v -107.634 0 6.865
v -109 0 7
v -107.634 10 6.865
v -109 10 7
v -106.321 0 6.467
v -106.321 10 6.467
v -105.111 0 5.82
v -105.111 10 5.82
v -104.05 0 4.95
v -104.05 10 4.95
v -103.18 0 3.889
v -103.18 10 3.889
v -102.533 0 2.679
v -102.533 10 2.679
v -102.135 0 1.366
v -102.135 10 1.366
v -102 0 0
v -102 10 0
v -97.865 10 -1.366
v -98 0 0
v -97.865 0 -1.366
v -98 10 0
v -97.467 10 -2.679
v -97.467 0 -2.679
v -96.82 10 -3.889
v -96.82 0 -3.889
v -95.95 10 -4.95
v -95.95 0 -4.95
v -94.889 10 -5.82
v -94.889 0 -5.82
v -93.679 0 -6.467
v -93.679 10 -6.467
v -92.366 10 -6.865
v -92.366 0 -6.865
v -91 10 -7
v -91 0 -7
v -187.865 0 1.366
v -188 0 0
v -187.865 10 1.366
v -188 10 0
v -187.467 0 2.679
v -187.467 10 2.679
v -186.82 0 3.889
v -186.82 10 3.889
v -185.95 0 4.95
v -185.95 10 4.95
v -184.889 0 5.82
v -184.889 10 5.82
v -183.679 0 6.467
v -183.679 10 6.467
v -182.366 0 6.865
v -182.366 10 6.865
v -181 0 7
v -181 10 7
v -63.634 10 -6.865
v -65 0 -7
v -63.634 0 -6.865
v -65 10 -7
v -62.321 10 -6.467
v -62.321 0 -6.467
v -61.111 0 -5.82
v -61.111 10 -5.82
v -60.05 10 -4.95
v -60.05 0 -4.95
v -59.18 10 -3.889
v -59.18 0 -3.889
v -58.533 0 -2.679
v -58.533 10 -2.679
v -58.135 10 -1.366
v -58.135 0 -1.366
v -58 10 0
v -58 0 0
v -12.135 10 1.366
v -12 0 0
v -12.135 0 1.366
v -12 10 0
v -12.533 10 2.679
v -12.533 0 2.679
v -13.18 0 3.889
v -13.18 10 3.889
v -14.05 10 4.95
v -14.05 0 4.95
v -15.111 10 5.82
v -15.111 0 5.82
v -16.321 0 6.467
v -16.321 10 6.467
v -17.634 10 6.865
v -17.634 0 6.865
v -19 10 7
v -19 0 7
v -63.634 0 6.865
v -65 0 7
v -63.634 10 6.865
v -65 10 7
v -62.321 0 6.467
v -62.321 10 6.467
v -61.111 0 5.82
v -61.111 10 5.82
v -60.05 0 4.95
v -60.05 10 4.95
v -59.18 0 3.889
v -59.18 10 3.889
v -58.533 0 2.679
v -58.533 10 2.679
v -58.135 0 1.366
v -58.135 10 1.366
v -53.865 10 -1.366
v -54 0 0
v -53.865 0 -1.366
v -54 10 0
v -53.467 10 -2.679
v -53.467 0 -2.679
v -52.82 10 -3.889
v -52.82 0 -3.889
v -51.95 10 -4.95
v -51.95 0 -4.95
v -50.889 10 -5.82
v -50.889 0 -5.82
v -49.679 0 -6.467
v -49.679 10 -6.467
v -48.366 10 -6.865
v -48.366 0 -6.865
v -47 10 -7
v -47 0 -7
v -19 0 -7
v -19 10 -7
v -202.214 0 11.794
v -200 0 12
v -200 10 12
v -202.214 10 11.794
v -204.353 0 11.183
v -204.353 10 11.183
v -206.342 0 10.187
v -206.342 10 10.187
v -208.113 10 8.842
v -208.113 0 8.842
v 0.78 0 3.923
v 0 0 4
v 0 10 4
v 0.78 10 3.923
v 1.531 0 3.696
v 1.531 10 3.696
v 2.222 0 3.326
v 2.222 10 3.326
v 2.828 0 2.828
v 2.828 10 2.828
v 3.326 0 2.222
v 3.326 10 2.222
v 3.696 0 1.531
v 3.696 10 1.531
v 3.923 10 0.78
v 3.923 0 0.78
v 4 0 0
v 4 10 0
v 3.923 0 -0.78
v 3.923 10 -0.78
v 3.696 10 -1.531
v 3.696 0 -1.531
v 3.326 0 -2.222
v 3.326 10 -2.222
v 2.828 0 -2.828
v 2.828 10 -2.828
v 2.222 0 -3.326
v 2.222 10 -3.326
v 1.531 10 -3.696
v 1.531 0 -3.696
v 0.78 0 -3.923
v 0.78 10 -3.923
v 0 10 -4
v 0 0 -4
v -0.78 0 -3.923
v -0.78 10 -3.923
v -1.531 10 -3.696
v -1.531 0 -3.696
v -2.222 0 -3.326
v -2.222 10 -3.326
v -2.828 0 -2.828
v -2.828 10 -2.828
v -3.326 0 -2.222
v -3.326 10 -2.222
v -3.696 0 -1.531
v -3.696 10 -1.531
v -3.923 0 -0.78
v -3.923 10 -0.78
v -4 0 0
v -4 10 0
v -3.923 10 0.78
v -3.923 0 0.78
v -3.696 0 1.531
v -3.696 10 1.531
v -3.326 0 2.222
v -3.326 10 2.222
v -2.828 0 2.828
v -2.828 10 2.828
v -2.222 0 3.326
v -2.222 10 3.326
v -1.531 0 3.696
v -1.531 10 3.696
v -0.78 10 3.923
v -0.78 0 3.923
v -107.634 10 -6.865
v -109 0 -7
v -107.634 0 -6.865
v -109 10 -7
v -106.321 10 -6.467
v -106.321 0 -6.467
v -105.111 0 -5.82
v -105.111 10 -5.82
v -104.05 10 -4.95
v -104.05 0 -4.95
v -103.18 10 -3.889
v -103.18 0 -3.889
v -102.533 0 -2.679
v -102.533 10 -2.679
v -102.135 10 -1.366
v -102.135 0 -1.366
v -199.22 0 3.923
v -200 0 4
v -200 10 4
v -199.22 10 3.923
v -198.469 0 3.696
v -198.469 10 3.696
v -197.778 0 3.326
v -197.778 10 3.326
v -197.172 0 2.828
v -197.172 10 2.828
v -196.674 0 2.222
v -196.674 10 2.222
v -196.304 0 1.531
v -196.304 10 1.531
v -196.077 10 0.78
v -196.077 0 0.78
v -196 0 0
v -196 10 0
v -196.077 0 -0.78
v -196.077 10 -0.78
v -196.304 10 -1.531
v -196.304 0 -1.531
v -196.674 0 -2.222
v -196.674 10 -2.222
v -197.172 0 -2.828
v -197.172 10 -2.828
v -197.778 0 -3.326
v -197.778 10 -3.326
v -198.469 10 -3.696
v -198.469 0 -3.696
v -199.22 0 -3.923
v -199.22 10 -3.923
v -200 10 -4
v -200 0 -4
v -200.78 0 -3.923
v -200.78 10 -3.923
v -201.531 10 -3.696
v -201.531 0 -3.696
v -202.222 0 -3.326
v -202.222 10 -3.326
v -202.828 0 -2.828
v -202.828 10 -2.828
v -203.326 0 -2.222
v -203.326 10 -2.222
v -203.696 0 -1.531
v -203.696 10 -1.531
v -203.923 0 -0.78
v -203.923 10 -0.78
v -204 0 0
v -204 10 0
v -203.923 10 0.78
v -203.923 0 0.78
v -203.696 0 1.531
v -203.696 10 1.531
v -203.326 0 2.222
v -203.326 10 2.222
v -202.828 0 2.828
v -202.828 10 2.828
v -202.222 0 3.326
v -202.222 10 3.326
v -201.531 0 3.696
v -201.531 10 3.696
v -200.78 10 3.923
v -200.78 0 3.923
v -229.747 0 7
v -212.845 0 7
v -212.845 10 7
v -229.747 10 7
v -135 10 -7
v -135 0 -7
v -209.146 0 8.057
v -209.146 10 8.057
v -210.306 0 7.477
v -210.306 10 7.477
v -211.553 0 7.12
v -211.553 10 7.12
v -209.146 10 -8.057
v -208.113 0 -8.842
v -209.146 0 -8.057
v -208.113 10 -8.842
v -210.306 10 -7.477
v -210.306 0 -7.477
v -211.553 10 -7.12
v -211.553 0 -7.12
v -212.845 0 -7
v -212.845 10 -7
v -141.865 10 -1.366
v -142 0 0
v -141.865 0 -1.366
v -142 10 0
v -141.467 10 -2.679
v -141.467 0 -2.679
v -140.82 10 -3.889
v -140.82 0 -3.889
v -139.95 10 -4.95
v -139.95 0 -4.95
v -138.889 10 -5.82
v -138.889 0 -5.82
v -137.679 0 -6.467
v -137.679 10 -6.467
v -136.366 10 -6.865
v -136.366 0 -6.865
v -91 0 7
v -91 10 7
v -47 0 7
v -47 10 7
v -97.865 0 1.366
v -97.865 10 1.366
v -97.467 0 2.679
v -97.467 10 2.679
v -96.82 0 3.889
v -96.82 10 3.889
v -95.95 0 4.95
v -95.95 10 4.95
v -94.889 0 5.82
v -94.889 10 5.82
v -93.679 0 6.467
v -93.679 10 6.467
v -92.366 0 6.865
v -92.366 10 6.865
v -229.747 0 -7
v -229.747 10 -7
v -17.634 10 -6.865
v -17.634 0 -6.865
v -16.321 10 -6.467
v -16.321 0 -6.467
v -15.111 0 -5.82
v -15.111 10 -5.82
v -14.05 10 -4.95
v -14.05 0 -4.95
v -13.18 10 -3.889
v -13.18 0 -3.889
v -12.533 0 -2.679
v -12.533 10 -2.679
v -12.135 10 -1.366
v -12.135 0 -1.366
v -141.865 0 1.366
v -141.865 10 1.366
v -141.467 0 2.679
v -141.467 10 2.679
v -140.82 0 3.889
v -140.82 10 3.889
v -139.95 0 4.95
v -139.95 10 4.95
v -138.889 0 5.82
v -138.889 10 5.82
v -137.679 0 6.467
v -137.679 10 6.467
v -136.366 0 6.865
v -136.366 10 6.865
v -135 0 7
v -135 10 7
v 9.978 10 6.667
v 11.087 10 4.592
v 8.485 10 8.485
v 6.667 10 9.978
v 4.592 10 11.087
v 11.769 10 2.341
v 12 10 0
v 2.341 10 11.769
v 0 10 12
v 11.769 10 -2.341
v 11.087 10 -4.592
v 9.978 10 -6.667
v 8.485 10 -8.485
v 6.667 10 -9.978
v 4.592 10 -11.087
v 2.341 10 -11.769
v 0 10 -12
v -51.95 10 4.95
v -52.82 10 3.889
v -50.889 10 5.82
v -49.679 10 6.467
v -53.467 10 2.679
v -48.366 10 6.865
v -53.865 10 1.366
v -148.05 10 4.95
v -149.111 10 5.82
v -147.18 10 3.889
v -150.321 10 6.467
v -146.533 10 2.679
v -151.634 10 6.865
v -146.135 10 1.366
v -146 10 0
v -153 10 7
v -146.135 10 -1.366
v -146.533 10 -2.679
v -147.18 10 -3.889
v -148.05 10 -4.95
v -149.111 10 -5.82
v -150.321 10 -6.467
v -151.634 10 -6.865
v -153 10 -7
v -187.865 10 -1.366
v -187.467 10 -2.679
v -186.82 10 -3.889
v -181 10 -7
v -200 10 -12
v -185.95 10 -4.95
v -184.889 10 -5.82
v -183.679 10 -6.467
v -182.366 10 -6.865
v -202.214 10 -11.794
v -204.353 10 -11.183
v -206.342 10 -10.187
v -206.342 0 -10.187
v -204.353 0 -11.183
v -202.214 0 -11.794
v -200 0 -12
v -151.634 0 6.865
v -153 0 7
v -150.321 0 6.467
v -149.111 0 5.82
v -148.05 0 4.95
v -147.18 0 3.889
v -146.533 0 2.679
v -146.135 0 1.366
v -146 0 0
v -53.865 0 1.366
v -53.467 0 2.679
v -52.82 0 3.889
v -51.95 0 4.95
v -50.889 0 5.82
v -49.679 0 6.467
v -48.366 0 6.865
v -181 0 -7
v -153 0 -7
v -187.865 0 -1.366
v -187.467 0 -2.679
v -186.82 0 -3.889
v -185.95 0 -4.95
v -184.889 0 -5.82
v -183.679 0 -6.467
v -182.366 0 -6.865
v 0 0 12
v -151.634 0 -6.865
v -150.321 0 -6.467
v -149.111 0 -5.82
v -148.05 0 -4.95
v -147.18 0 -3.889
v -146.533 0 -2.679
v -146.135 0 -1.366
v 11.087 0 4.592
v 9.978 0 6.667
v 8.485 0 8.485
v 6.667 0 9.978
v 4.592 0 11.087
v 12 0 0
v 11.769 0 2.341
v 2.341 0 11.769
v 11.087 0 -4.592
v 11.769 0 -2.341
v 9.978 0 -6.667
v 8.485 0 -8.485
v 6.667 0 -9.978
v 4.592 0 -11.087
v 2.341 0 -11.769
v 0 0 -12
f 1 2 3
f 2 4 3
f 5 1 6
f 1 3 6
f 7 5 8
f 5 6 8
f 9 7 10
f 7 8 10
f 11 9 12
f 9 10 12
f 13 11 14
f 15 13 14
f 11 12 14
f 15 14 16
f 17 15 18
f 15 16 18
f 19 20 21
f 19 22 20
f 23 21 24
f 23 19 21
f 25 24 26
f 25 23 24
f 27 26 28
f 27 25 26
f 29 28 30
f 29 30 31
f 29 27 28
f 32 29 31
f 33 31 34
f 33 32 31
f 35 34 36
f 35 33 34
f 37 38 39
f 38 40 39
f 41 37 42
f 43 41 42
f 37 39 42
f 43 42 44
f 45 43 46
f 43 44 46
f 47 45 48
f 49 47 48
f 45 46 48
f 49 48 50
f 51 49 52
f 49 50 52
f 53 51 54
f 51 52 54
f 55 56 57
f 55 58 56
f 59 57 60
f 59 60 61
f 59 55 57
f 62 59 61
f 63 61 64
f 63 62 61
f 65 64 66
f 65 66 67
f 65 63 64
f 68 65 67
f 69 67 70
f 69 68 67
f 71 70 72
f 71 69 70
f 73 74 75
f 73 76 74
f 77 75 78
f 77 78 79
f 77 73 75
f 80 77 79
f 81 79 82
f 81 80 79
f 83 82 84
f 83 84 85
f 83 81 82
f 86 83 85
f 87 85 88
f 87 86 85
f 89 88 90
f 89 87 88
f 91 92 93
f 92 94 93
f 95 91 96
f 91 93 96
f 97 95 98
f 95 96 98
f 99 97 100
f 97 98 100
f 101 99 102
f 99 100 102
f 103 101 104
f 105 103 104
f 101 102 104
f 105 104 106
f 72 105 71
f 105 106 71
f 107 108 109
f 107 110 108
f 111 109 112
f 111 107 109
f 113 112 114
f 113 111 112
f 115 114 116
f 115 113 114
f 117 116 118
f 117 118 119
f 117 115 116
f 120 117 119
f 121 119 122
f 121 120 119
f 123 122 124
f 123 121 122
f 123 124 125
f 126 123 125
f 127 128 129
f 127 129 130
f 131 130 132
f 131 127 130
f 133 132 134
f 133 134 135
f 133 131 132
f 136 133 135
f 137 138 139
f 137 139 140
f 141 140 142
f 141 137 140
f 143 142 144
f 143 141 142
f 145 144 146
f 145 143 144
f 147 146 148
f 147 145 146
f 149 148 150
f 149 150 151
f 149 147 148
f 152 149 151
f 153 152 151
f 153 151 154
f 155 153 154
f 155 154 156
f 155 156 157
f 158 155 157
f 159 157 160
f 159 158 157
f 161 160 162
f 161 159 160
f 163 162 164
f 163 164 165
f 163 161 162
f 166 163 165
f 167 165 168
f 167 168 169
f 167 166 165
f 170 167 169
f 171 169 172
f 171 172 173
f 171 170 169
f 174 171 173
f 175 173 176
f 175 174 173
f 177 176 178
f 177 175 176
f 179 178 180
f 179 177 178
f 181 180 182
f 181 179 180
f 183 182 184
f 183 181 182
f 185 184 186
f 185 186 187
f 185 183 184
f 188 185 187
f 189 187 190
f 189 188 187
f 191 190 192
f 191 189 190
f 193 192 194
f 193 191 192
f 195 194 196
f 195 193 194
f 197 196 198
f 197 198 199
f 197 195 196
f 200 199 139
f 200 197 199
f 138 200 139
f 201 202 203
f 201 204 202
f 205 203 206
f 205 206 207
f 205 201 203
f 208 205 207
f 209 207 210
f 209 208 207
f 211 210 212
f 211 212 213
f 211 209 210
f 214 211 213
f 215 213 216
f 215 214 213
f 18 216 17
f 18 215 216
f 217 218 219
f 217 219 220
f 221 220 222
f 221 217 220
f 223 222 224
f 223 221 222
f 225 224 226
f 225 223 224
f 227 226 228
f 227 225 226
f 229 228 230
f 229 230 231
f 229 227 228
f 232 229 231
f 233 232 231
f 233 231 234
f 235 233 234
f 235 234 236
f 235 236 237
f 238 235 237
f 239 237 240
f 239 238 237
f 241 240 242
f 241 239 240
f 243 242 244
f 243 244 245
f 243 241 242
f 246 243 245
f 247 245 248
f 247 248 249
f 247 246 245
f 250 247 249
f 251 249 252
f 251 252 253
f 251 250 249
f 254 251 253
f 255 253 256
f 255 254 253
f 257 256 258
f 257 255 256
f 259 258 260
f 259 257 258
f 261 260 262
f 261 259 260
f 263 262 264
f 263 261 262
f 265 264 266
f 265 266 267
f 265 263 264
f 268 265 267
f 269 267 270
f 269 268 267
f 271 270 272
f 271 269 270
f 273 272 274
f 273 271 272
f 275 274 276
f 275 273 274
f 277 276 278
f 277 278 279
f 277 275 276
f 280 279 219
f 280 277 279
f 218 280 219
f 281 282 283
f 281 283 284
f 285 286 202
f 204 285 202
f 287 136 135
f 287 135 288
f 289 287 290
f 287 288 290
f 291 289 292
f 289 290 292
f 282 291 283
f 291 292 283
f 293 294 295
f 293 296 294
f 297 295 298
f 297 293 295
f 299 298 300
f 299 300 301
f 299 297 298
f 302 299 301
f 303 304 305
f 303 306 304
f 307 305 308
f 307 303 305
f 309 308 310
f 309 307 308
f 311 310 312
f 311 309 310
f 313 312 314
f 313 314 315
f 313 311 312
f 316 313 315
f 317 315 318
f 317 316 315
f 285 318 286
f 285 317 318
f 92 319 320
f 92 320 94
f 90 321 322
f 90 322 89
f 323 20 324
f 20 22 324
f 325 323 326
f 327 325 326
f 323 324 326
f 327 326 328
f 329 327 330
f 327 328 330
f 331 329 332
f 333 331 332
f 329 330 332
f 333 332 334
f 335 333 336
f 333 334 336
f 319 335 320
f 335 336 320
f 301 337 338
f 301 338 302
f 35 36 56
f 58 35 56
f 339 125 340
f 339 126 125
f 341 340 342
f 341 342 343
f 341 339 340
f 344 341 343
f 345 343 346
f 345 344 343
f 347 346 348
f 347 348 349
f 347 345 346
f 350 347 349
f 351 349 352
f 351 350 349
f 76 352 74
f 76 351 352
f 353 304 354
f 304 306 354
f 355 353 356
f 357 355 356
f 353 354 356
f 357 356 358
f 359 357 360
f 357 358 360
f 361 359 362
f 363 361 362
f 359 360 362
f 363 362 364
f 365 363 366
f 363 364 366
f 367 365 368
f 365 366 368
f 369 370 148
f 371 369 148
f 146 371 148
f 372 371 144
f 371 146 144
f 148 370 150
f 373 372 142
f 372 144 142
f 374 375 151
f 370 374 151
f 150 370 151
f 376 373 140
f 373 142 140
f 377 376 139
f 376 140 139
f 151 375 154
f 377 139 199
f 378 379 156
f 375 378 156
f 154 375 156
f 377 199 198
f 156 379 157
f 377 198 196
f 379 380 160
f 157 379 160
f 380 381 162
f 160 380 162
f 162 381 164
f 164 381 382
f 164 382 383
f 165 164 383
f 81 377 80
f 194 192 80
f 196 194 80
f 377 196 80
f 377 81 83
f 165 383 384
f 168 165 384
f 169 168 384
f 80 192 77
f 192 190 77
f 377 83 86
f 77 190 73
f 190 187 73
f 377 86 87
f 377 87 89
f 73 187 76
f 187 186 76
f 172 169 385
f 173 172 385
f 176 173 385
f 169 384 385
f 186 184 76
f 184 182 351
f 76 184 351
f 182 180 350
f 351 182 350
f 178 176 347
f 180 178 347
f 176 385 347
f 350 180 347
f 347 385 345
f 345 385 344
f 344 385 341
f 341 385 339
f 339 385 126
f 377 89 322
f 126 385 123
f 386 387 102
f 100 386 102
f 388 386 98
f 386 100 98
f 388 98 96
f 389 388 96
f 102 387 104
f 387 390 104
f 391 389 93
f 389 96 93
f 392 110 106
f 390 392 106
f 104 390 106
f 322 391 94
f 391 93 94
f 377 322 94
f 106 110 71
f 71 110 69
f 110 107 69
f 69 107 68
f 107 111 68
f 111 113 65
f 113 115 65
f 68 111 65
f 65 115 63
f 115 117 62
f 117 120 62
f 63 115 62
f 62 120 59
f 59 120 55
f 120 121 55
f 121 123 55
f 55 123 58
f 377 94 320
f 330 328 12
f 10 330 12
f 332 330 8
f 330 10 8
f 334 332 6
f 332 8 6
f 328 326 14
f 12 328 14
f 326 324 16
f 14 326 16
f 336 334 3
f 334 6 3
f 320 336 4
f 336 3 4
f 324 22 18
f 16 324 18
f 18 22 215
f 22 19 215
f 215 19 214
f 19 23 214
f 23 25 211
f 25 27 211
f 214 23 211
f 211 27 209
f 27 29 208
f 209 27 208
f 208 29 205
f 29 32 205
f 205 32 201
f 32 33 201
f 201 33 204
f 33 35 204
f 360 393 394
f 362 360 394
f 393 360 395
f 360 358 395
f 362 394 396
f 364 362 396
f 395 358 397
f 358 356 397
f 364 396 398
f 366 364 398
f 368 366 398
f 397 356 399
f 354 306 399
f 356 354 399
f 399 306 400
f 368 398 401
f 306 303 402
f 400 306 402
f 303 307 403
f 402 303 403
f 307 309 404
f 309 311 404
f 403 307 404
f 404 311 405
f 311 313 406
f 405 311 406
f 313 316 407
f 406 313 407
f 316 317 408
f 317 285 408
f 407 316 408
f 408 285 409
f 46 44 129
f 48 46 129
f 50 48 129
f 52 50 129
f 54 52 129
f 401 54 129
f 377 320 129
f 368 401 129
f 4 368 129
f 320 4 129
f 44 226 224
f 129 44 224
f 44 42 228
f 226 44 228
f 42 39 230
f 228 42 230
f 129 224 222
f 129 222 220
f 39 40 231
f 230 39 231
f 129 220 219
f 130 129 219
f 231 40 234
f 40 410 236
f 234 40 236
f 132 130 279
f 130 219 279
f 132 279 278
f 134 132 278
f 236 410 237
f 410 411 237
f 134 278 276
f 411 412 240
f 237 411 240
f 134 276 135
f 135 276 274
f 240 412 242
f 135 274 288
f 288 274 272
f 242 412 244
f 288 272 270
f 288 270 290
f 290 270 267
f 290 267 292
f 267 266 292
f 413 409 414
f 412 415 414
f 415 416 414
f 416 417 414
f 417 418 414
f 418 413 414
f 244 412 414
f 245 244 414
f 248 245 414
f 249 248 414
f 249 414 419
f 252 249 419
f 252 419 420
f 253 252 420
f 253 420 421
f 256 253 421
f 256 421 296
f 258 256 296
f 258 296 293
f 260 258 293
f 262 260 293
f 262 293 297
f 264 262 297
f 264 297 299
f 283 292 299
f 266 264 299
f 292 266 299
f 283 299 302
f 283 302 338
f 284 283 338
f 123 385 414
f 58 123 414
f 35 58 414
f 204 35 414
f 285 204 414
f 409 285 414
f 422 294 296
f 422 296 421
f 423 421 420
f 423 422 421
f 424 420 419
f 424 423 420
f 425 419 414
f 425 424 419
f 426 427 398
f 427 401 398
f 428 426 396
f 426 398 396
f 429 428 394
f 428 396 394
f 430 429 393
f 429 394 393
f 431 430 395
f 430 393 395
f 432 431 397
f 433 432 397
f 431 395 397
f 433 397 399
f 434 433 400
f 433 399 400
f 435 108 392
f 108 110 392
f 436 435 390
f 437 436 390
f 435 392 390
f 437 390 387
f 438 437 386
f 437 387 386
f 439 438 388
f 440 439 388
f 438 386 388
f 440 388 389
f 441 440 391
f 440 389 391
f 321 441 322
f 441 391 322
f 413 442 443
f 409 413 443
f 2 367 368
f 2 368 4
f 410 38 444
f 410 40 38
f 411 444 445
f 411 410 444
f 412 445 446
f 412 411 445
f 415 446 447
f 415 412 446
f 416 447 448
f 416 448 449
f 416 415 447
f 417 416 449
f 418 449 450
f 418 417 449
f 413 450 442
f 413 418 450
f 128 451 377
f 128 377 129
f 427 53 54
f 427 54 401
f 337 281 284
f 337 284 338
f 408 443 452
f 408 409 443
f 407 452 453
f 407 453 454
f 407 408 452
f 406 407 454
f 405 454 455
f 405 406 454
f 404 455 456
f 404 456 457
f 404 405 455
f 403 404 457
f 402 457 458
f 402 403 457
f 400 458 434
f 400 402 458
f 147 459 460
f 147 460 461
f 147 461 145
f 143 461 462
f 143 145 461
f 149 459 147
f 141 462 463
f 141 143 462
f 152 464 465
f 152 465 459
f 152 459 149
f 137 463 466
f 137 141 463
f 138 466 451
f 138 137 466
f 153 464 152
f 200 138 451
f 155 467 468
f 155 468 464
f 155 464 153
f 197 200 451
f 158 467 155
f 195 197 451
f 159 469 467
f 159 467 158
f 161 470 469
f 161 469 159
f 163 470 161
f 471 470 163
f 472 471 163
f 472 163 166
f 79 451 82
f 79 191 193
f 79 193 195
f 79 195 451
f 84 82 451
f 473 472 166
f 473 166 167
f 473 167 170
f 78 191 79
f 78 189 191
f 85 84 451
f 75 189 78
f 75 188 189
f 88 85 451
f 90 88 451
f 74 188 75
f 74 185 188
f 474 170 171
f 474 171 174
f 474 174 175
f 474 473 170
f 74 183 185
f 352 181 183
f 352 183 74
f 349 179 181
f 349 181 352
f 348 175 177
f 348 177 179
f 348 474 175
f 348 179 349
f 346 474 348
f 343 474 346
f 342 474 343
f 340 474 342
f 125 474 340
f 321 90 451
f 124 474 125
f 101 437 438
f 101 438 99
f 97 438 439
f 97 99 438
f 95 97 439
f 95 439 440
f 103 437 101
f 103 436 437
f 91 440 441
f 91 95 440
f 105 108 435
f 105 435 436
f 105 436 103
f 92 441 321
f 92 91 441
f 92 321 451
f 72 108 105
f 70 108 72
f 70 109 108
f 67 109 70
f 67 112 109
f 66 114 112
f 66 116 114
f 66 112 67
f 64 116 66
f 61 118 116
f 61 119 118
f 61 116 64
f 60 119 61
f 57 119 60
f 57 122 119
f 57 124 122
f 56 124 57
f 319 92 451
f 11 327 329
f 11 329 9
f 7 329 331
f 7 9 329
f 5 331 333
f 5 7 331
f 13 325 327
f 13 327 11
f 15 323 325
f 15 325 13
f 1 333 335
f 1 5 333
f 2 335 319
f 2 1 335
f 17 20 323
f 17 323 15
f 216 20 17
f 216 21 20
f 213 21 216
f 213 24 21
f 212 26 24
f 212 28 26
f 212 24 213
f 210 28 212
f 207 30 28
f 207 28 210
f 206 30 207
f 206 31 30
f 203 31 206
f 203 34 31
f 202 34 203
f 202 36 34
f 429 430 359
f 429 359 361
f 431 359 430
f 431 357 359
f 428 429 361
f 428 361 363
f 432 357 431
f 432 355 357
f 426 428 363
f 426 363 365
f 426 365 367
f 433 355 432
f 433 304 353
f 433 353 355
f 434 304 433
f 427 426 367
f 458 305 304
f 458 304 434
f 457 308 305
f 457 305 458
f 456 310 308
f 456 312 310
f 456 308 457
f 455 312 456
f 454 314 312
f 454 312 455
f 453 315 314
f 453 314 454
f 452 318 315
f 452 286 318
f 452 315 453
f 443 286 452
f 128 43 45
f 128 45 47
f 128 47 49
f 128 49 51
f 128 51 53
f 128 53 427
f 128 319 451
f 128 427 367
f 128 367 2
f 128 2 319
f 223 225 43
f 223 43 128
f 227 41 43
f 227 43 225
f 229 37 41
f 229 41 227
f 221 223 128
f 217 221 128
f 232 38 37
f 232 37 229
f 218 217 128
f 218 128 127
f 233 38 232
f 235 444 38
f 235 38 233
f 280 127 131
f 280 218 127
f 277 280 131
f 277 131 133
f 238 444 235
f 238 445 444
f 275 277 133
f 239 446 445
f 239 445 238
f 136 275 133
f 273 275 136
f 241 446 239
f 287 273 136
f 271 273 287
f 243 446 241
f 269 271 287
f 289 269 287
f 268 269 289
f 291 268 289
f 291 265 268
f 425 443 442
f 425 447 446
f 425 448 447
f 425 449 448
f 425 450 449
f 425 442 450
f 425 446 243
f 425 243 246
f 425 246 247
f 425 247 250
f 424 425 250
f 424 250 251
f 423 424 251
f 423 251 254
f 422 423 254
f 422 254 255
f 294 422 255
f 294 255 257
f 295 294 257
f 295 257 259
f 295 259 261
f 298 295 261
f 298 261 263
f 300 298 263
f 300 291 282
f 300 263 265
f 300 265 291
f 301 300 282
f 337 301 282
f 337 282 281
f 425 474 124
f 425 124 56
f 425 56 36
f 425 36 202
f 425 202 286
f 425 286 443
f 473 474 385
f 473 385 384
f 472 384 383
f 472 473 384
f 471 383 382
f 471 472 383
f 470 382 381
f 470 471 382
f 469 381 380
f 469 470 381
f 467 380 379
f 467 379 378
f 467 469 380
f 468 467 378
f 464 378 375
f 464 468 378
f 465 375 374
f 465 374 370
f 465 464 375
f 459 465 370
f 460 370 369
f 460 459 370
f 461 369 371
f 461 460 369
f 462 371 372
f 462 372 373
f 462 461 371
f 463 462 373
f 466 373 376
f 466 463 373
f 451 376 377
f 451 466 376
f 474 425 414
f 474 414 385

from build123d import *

# Parameters (mm, degrees)
SKETCH1_R           = 4
SKETCH1_W           = 42
SKETCH1_H           = 14
SKETCH1_W_2         = 40
BOSS_EXTRUDE1_DEPTH = 10
FILLET1_R           = 7


with BuildPart() as part:
    # Sketch1 → Boss-Extrude1 (new body)
    with BuildSketch(Plane(origin=(0, 0, 0), x_dir=(1, 0, 0), z_dir=(0, 1, 0))):
        with BuildLine():
            Line((-200, 12), (0, 12))
            ThreePointArc((0, 12), (12, 0), (0, -12))
            Line((0, -12), (-200, -12))
            ThreePointArc((-200, -12), (-205.477225575, -10.677078252), (-209.746794345, -7))
            Line((-209.746794345, -7), (-229.746794345, -7))
            Line((-229.746794345, -7), (-229.746794345, 7))
            Line((-229.746794345, 7), (-209.746794345, 7))
            ThreePointArc((-209.746794345, 7), (-205.477225575, 10.677078252), (-200, 12))
        make_face()
        with Locations(Location((-200, 0, 0), (0, 0, 270))):
            Circle(SKETCH1_R, mode=Mode.SUBTRACT)
        with Locations(Location((0, 0, 0), (0, 0, 270))):
            Circle(SKETCH1_R, mode=Mode.SUBTRACT)
        with Locations((-167, 0)):
            Rectangle(SKETCH1_W, SKETCH1_H, mode=Mode.SUBTRACT)
        with Locations((-122, 0)):
            Rectangle(SKETCH1_W_2, SKETCH1_H, mode=Mode.SUBTRACT)
        with Locations((-78, 0)):
            Rectangle(SKETCH1_W_2, SKETCH1_H, mode=Mode.SUBTRACT)
        with Locations((-33, 0)):
            Rectangle(SKETCH1_W, SKETCH1_H, mode=Mode.SUBTRACT)
    extrude(amount=BOSS_EXTRUDE1_DEPTH)

    # Fillet1
    fillet1_edges = [part.edges().sort_by_distance(p)[0] for p in [
        (-142, 5, -7),
        (-98, 5, -7),
        (-54, 5, -7),
        (-58, 5, -7),
        (-12, 5, -7),
        (-102, 5, -7),
        (-146, 5, -7),
        (-146, 5, 7),
        (-102, 5, 7),
        (-58, 5, 7),
        (-12, 5, 7),
        (-54, 5, 7),
        (-98, 5, 7),
        (-142, 5, 7),
        (-188, 5, 7),
        (-188, 5, -7),
        (-209.746794345, 5, 7),
        (-209.746794345, 5, -7),
    ]]
    fillet(fillet1_edges, radius=FILLET1_R - 0.0001)  # a hair under: the kernel refuses the full size


solid = part.part
